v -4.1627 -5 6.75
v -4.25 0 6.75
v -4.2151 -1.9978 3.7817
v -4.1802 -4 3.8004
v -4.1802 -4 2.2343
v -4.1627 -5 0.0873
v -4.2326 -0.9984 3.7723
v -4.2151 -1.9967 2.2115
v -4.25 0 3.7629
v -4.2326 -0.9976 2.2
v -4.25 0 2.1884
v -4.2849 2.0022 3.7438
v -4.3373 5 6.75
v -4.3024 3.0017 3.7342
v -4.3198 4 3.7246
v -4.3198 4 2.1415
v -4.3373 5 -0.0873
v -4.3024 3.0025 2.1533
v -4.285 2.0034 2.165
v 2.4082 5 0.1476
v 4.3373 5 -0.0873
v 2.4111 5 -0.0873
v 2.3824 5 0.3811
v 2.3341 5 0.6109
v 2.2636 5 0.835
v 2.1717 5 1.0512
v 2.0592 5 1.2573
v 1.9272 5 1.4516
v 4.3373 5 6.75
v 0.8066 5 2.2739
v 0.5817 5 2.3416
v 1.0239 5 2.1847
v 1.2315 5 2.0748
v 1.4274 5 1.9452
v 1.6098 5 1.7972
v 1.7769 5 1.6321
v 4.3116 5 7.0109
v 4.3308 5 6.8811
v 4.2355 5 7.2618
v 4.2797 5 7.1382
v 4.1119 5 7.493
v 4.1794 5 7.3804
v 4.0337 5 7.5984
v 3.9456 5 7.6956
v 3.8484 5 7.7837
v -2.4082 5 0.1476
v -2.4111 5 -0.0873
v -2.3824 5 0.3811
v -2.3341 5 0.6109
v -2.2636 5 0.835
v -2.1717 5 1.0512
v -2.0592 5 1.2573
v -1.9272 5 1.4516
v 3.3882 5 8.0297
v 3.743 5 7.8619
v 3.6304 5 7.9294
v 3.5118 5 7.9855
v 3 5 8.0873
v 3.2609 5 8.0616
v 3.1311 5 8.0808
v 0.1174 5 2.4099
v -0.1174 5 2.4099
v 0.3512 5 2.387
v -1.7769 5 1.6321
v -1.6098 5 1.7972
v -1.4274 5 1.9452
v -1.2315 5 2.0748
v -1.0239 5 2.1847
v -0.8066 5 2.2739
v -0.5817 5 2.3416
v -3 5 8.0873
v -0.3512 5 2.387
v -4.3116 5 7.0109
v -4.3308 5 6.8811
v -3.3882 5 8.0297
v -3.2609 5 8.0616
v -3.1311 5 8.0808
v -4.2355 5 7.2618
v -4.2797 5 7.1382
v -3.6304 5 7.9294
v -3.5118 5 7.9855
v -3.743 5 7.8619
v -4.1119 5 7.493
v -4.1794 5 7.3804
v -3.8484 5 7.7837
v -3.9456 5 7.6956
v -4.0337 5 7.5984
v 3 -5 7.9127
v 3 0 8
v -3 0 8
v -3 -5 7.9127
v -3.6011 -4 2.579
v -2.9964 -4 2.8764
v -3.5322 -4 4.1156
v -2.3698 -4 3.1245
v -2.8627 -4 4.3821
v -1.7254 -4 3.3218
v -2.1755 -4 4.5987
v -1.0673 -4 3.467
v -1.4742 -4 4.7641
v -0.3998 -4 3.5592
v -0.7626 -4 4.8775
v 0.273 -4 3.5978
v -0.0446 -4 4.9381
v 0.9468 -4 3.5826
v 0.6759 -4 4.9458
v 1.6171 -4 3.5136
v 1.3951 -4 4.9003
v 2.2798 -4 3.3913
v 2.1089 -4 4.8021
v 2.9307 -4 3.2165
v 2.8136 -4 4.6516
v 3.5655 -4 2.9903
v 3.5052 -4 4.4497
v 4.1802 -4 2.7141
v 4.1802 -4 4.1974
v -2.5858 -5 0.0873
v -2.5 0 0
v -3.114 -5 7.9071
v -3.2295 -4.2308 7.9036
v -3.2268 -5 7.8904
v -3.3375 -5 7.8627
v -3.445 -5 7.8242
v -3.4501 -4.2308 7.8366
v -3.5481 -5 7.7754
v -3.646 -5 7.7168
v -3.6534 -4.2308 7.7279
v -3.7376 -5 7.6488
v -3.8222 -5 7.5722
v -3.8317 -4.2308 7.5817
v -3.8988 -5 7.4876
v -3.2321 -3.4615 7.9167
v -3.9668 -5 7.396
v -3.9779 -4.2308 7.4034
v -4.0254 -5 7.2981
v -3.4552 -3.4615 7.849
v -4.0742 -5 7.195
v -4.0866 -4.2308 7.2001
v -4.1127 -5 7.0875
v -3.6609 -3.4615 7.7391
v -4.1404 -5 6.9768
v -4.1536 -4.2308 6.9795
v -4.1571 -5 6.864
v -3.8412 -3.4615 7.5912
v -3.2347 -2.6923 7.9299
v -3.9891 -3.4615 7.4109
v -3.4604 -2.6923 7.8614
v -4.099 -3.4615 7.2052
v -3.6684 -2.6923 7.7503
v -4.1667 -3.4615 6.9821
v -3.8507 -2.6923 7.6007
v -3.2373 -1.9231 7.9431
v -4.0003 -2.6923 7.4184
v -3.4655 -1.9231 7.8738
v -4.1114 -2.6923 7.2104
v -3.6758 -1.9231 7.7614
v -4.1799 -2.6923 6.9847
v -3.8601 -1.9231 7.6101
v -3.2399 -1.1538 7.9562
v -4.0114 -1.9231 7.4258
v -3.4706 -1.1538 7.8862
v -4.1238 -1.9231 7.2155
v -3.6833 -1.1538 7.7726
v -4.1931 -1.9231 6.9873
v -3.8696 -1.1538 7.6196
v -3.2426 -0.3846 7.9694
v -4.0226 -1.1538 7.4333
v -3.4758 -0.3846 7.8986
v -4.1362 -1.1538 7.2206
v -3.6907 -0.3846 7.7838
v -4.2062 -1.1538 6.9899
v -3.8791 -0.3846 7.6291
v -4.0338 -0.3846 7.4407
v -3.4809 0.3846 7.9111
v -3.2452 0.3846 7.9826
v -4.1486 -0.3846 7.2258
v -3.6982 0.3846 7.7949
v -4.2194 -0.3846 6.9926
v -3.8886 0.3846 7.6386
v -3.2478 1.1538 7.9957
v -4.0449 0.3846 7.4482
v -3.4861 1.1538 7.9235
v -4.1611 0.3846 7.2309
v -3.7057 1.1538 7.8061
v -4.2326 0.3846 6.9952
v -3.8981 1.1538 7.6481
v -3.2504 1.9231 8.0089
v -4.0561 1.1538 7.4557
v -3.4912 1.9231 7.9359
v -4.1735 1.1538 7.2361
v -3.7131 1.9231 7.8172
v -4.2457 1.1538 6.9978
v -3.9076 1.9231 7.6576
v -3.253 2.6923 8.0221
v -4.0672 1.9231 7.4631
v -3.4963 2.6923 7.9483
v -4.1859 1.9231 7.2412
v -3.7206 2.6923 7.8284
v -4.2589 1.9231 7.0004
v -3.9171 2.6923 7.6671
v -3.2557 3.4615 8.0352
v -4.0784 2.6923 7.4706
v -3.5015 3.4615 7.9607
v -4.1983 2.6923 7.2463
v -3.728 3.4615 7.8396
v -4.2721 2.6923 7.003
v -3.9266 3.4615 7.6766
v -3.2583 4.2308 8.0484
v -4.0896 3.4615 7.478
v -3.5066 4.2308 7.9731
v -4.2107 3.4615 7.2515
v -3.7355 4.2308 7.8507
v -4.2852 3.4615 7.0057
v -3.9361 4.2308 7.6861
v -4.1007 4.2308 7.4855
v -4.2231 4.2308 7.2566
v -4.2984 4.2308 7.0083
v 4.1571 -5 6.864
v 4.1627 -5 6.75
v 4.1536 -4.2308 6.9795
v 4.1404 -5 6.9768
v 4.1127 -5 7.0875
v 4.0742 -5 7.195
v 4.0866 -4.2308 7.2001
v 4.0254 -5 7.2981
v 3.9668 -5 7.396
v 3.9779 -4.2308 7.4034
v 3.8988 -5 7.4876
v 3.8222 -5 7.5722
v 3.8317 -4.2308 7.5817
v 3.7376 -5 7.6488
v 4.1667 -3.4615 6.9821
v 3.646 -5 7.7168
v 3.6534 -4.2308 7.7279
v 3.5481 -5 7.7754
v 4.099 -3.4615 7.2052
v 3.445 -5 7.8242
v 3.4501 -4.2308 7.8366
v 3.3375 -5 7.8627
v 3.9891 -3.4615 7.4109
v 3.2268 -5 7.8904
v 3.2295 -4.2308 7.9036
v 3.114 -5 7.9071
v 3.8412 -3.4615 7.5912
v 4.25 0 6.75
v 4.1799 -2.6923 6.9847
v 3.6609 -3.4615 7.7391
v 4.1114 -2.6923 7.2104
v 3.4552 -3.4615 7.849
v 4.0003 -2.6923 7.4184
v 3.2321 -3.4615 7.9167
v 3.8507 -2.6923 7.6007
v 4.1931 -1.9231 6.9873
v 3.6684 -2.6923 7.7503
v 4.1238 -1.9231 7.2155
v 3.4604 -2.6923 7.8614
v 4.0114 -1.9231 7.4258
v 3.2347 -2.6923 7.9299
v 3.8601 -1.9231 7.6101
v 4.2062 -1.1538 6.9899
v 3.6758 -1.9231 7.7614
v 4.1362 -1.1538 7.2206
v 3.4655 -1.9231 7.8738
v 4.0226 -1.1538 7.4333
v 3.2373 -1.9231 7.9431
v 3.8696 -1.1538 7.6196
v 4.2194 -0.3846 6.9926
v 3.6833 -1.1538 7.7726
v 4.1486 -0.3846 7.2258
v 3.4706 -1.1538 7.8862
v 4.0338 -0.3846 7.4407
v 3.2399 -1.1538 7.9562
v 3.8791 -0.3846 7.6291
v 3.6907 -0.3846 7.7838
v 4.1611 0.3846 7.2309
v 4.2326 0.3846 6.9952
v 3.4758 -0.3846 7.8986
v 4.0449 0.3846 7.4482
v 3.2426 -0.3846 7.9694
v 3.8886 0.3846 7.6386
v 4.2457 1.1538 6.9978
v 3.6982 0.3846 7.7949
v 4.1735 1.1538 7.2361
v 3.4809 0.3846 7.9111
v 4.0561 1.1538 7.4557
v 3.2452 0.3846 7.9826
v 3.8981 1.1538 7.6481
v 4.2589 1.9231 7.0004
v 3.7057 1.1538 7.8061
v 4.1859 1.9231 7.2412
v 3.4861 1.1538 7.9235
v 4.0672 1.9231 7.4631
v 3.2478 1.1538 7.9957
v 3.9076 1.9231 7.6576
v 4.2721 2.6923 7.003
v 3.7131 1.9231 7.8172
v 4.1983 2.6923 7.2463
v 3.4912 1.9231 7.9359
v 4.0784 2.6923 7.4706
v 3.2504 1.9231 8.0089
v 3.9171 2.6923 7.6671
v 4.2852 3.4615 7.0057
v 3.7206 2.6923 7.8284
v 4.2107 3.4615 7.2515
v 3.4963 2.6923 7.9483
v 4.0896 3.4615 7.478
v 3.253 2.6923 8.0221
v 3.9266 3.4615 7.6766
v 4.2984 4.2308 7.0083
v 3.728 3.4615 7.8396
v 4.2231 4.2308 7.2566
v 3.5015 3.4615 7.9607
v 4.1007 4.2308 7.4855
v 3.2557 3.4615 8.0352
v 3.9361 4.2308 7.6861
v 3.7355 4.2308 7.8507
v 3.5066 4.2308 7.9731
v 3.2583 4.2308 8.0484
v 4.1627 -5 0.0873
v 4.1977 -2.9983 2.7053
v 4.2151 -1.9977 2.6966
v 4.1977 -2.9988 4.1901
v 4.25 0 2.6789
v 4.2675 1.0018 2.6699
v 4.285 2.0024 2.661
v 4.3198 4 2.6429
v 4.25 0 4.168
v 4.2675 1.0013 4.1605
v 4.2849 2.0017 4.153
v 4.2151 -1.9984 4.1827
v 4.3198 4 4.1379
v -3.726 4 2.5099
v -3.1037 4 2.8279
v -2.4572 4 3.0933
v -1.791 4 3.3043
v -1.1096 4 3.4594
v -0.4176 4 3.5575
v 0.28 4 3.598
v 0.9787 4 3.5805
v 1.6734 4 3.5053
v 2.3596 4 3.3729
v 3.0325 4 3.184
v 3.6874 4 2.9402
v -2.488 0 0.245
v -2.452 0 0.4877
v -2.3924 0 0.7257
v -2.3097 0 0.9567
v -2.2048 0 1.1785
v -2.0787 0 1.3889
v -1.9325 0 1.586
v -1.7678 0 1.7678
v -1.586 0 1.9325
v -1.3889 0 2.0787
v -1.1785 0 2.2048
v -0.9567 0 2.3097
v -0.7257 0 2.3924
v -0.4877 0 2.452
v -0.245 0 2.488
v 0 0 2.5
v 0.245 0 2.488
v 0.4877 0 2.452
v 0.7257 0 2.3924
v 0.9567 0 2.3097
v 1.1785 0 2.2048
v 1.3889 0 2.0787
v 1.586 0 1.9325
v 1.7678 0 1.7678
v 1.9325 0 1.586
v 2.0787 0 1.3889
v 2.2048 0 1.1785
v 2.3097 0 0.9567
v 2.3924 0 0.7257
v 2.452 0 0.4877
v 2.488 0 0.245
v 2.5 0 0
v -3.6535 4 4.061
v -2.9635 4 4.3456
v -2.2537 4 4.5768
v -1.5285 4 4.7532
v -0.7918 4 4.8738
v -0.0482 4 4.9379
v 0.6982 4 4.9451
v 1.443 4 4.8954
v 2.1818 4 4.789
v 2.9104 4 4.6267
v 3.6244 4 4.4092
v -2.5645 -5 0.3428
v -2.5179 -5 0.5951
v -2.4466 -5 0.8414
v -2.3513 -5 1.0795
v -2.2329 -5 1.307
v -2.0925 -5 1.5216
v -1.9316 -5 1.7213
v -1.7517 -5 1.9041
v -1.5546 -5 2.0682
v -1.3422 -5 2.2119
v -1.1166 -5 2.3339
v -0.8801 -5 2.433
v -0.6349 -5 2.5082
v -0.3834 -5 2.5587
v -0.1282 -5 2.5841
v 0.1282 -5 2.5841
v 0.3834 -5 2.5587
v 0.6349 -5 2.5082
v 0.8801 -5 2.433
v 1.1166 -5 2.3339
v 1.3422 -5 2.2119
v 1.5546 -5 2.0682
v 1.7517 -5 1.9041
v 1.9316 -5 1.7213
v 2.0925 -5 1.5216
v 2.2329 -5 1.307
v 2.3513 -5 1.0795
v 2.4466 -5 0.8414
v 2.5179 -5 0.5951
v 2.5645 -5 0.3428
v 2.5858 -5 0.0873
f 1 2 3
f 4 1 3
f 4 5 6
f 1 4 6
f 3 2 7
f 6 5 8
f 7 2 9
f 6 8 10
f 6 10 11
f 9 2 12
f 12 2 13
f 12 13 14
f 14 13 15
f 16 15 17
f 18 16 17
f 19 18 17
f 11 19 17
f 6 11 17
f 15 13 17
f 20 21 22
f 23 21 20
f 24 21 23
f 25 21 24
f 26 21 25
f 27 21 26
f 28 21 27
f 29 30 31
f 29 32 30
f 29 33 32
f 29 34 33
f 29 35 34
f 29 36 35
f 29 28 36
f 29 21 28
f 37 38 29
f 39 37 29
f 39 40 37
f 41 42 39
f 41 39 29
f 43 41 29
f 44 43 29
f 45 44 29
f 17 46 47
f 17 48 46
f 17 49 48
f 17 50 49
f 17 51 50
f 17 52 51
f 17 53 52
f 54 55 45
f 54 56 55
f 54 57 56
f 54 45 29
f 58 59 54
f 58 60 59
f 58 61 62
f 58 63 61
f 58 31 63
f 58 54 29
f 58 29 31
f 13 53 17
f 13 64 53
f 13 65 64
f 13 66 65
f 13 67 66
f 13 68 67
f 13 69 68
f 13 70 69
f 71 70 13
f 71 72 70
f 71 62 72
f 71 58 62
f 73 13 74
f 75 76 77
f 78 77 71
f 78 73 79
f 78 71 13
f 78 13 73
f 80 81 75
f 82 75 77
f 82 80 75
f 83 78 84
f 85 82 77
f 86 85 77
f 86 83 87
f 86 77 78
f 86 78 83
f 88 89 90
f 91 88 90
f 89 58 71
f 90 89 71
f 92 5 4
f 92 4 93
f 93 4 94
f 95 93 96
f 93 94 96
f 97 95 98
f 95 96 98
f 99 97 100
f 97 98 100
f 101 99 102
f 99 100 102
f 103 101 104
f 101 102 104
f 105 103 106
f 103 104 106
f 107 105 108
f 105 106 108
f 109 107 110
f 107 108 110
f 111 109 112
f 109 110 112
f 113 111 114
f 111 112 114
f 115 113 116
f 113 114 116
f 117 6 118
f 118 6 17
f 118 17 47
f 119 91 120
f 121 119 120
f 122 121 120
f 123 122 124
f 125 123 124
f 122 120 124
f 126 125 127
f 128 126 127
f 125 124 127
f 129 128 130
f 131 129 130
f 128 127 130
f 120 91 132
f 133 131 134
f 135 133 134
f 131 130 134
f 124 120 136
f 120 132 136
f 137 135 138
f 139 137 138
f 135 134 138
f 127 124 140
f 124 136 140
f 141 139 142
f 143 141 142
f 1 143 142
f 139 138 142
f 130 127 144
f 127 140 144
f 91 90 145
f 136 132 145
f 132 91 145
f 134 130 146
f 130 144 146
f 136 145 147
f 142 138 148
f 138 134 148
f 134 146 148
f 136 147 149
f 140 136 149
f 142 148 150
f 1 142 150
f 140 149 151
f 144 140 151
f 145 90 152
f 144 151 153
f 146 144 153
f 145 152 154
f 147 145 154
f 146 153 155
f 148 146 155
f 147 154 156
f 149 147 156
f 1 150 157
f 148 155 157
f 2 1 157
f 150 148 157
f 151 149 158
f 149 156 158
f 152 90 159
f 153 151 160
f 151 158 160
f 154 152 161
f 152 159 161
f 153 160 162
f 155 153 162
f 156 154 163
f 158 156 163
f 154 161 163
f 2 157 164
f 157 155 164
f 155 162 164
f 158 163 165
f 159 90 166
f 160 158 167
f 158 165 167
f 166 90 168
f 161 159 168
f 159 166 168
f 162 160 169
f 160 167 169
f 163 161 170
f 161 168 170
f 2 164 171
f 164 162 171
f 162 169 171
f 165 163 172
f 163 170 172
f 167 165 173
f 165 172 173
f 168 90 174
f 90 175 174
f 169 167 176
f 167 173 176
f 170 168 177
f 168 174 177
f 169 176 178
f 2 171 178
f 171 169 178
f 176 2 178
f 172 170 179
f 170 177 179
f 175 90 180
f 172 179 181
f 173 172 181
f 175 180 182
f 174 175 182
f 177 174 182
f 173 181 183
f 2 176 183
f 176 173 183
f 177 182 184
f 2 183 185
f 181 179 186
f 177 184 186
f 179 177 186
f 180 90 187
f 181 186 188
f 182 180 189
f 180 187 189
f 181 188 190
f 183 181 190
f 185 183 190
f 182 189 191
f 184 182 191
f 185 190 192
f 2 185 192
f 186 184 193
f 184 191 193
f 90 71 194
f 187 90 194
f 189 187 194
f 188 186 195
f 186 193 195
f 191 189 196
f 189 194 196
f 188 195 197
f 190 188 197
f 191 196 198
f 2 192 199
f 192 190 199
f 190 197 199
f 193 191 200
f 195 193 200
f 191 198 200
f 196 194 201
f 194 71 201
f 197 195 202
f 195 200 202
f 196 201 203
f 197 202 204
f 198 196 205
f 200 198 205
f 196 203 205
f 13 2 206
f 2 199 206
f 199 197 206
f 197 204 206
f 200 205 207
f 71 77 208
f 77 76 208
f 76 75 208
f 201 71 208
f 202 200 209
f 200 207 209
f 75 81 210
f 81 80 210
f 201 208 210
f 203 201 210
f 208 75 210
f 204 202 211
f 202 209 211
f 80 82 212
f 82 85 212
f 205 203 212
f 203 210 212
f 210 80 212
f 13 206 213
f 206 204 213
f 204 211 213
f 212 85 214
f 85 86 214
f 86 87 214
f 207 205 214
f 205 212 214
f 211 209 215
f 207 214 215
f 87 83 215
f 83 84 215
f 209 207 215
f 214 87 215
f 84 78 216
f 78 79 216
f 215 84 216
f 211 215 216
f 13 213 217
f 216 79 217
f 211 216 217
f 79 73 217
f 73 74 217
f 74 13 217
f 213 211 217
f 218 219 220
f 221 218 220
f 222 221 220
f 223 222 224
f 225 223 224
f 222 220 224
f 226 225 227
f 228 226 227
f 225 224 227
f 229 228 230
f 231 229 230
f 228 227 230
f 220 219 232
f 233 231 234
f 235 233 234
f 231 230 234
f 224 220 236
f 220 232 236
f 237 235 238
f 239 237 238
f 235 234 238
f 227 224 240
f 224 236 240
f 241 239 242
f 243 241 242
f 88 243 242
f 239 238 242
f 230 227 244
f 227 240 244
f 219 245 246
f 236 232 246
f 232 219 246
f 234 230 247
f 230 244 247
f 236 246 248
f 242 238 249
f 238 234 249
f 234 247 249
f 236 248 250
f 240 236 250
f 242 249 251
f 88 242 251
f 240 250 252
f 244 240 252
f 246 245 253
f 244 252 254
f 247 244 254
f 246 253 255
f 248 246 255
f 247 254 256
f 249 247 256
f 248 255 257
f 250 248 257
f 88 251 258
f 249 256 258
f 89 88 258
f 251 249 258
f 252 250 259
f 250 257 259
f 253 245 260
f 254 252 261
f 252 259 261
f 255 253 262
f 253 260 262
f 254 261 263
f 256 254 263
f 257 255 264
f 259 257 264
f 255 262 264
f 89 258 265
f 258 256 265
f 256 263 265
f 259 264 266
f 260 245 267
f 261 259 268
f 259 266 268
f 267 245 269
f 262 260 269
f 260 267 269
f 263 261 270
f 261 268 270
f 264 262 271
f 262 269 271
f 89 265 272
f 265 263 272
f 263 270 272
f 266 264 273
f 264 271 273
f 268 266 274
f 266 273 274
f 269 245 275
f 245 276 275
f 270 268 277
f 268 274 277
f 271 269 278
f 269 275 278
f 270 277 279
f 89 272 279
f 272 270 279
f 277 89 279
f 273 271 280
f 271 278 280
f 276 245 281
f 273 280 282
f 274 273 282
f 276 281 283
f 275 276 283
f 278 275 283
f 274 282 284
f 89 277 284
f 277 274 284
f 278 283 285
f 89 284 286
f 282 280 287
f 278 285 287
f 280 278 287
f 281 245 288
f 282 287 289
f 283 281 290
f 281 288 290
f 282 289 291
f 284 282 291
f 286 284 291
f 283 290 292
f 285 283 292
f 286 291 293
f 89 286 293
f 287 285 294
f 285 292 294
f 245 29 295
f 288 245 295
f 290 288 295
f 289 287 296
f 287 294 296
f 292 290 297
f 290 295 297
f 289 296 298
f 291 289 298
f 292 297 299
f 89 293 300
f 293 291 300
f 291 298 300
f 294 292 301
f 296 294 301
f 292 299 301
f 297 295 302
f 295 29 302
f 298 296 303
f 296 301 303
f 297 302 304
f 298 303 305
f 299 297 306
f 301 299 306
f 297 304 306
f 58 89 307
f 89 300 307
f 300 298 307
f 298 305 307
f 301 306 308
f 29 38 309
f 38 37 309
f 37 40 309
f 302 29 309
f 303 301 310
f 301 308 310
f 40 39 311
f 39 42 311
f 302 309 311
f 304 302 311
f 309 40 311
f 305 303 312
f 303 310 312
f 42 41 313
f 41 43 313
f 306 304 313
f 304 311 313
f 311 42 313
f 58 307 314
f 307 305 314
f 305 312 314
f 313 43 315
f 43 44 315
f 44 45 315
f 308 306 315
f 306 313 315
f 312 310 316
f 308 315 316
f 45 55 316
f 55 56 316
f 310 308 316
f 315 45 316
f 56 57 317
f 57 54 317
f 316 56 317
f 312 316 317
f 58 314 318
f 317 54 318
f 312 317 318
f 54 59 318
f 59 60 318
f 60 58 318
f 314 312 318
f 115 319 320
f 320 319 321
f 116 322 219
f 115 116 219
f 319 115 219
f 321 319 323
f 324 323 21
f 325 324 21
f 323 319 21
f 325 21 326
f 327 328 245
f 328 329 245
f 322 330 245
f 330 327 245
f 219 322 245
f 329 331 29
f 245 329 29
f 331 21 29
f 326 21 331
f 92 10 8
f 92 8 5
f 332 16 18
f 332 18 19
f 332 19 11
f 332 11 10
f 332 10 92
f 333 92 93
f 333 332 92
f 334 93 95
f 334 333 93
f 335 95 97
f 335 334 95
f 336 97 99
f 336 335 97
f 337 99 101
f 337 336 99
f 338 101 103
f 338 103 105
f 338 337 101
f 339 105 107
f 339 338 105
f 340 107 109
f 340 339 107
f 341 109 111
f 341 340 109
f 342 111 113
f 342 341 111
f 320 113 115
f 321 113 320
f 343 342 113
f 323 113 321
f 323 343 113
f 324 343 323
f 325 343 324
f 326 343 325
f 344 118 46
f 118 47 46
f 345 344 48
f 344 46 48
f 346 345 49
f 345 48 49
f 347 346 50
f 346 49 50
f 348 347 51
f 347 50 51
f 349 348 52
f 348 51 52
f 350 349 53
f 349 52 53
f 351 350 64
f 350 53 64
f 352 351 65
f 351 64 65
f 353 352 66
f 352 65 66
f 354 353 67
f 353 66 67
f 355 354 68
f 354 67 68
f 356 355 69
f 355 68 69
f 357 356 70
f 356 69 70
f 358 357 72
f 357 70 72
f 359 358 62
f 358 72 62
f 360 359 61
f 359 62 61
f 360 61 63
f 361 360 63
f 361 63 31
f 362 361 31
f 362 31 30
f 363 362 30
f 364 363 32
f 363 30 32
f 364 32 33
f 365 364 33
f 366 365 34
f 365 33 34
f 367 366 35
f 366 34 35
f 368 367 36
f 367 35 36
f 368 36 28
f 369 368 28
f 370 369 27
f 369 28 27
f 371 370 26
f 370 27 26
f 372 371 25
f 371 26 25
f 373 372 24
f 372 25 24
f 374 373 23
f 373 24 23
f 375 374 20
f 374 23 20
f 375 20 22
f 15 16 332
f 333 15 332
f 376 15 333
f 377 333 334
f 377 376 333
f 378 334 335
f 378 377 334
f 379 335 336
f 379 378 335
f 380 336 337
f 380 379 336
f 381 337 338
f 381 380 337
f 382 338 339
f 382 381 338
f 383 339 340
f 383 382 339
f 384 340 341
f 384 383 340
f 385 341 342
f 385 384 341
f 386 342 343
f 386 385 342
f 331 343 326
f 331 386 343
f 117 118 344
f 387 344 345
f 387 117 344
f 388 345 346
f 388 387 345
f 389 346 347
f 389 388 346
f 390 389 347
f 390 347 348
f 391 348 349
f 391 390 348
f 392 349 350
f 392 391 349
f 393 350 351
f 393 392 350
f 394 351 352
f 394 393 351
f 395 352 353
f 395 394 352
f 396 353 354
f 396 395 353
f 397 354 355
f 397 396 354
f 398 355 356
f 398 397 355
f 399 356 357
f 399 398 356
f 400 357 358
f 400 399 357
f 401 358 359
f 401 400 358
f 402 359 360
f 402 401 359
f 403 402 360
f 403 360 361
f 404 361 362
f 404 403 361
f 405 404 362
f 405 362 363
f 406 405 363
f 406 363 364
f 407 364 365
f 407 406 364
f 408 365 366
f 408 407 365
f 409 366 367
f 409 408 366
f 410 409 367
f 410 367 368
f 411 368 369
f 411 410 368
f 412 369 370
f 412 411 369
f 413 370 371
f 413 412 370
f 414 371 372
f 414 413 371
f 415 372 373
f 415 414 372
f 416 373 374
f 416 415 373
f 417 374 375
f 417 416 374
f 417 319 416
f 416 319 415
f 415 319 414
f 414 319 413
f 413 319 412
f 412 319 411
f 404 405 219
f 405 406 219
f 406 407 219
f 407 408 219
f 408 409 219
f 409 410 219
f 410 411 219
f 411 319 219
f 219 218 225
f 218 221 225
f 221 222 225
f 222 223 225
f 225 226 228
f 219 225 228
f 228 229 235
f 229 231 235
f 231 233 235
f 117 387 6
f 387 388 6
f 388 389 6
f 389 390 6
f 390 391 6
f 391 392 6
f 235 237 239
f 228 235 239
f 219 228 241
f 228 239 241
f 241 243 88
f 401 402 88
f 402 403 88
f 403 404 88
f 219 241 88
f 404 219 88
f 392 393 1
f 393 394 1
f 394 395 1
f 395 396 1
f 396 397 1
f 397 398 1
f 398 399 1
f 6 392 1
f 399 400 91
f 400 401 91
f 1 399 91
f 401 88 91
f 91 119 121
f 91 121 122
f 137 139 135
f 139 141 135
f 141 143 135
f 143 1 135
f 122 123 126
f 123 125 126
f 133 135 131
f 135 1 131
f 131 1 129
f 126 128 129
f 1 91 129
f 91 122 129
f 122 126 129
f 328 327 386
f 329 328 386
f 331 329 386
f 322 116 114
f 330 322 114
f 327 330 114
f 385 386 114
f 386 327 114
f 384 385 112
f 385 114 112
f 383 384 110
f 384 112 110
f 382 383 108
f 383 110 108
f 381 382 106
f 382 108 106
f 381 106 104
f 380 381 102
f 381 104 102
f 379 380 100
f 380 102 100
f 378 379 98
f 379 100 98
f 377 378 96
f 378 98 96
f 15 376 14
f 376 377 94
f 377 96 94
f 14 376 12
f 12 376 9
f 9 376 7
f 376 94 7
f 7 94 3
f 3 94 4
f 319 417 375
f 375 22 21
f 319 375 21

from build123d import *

# Parameters (mm, degrees)
F1_DEPTH      = 5
F1_TAPER      = 1
F1_DEPTH_BACK = 5
F1_TAPER_BACK = -1
F3_DEPTH      = 4
F3_DEPTH_BACK = 4


with BuildPart() as f1:
    # F0 (on Front) → F1 (new body, two sides)
    with BuildSketch(Plane.XZ) as f1_sk:
        with BuildLine():
            Line((-4.25, 0), (-2.5, 0))
            ThreePointArc((-2.5, 0), (0, 2.5), (2.5, 0))
            Line((2.5, 0), (4.25, 0))
            Line((4.25, 0), (4.25, 6.75))
            ThreePointArc((4.25, 6.75), (3.8838834765, 7.6338834765), (3, 8))
            Line((3, 8), (-3, 8))
            ThreePointArc((-3, 8), (-3.8838834765, 7.6338834765), (-4.25, 6.75))
            Line((-4.25, 6.75), (-4.25, 0))
        make_face()
    extrude(amount=F1_DEPTH, taper=F1_TAPER)
    extrude(f1_sk.sketch, amount=-F1_DEPTH_BACK, taper=F1_TAPER_BACK)

    # F2 (on Front) → F3 (cut, two sides)
    with BuildSketch(Plane.XZ) as f3_sk:
        with BuildLine():
            Line((6.4694641293, 1.040801663), (7.544499329, 1.8698255615))
            ThreePointArc((7.544499329, 1.8698255615), (0.598902995, 4.9474672346), (-6.4549577741, 2.1267873604))
            Line((-6.4549577741, 2.1267873604), (-5.4162036647, 1.2539537409))
            ThreePointArc((-5.4162036647, 1.2539537409), (0.5705742402, 3.5977590678), (6.4694641293, 1.040801663))
        make_face()
    extrude(amount=-F3_DEPTH, mode=Mode.SUBTRACT)
    extrude(f3_sk.sketch, amount=F3_DEPTH_BACK, mode=Mode.SUBTRACT)


solid = f1.part
